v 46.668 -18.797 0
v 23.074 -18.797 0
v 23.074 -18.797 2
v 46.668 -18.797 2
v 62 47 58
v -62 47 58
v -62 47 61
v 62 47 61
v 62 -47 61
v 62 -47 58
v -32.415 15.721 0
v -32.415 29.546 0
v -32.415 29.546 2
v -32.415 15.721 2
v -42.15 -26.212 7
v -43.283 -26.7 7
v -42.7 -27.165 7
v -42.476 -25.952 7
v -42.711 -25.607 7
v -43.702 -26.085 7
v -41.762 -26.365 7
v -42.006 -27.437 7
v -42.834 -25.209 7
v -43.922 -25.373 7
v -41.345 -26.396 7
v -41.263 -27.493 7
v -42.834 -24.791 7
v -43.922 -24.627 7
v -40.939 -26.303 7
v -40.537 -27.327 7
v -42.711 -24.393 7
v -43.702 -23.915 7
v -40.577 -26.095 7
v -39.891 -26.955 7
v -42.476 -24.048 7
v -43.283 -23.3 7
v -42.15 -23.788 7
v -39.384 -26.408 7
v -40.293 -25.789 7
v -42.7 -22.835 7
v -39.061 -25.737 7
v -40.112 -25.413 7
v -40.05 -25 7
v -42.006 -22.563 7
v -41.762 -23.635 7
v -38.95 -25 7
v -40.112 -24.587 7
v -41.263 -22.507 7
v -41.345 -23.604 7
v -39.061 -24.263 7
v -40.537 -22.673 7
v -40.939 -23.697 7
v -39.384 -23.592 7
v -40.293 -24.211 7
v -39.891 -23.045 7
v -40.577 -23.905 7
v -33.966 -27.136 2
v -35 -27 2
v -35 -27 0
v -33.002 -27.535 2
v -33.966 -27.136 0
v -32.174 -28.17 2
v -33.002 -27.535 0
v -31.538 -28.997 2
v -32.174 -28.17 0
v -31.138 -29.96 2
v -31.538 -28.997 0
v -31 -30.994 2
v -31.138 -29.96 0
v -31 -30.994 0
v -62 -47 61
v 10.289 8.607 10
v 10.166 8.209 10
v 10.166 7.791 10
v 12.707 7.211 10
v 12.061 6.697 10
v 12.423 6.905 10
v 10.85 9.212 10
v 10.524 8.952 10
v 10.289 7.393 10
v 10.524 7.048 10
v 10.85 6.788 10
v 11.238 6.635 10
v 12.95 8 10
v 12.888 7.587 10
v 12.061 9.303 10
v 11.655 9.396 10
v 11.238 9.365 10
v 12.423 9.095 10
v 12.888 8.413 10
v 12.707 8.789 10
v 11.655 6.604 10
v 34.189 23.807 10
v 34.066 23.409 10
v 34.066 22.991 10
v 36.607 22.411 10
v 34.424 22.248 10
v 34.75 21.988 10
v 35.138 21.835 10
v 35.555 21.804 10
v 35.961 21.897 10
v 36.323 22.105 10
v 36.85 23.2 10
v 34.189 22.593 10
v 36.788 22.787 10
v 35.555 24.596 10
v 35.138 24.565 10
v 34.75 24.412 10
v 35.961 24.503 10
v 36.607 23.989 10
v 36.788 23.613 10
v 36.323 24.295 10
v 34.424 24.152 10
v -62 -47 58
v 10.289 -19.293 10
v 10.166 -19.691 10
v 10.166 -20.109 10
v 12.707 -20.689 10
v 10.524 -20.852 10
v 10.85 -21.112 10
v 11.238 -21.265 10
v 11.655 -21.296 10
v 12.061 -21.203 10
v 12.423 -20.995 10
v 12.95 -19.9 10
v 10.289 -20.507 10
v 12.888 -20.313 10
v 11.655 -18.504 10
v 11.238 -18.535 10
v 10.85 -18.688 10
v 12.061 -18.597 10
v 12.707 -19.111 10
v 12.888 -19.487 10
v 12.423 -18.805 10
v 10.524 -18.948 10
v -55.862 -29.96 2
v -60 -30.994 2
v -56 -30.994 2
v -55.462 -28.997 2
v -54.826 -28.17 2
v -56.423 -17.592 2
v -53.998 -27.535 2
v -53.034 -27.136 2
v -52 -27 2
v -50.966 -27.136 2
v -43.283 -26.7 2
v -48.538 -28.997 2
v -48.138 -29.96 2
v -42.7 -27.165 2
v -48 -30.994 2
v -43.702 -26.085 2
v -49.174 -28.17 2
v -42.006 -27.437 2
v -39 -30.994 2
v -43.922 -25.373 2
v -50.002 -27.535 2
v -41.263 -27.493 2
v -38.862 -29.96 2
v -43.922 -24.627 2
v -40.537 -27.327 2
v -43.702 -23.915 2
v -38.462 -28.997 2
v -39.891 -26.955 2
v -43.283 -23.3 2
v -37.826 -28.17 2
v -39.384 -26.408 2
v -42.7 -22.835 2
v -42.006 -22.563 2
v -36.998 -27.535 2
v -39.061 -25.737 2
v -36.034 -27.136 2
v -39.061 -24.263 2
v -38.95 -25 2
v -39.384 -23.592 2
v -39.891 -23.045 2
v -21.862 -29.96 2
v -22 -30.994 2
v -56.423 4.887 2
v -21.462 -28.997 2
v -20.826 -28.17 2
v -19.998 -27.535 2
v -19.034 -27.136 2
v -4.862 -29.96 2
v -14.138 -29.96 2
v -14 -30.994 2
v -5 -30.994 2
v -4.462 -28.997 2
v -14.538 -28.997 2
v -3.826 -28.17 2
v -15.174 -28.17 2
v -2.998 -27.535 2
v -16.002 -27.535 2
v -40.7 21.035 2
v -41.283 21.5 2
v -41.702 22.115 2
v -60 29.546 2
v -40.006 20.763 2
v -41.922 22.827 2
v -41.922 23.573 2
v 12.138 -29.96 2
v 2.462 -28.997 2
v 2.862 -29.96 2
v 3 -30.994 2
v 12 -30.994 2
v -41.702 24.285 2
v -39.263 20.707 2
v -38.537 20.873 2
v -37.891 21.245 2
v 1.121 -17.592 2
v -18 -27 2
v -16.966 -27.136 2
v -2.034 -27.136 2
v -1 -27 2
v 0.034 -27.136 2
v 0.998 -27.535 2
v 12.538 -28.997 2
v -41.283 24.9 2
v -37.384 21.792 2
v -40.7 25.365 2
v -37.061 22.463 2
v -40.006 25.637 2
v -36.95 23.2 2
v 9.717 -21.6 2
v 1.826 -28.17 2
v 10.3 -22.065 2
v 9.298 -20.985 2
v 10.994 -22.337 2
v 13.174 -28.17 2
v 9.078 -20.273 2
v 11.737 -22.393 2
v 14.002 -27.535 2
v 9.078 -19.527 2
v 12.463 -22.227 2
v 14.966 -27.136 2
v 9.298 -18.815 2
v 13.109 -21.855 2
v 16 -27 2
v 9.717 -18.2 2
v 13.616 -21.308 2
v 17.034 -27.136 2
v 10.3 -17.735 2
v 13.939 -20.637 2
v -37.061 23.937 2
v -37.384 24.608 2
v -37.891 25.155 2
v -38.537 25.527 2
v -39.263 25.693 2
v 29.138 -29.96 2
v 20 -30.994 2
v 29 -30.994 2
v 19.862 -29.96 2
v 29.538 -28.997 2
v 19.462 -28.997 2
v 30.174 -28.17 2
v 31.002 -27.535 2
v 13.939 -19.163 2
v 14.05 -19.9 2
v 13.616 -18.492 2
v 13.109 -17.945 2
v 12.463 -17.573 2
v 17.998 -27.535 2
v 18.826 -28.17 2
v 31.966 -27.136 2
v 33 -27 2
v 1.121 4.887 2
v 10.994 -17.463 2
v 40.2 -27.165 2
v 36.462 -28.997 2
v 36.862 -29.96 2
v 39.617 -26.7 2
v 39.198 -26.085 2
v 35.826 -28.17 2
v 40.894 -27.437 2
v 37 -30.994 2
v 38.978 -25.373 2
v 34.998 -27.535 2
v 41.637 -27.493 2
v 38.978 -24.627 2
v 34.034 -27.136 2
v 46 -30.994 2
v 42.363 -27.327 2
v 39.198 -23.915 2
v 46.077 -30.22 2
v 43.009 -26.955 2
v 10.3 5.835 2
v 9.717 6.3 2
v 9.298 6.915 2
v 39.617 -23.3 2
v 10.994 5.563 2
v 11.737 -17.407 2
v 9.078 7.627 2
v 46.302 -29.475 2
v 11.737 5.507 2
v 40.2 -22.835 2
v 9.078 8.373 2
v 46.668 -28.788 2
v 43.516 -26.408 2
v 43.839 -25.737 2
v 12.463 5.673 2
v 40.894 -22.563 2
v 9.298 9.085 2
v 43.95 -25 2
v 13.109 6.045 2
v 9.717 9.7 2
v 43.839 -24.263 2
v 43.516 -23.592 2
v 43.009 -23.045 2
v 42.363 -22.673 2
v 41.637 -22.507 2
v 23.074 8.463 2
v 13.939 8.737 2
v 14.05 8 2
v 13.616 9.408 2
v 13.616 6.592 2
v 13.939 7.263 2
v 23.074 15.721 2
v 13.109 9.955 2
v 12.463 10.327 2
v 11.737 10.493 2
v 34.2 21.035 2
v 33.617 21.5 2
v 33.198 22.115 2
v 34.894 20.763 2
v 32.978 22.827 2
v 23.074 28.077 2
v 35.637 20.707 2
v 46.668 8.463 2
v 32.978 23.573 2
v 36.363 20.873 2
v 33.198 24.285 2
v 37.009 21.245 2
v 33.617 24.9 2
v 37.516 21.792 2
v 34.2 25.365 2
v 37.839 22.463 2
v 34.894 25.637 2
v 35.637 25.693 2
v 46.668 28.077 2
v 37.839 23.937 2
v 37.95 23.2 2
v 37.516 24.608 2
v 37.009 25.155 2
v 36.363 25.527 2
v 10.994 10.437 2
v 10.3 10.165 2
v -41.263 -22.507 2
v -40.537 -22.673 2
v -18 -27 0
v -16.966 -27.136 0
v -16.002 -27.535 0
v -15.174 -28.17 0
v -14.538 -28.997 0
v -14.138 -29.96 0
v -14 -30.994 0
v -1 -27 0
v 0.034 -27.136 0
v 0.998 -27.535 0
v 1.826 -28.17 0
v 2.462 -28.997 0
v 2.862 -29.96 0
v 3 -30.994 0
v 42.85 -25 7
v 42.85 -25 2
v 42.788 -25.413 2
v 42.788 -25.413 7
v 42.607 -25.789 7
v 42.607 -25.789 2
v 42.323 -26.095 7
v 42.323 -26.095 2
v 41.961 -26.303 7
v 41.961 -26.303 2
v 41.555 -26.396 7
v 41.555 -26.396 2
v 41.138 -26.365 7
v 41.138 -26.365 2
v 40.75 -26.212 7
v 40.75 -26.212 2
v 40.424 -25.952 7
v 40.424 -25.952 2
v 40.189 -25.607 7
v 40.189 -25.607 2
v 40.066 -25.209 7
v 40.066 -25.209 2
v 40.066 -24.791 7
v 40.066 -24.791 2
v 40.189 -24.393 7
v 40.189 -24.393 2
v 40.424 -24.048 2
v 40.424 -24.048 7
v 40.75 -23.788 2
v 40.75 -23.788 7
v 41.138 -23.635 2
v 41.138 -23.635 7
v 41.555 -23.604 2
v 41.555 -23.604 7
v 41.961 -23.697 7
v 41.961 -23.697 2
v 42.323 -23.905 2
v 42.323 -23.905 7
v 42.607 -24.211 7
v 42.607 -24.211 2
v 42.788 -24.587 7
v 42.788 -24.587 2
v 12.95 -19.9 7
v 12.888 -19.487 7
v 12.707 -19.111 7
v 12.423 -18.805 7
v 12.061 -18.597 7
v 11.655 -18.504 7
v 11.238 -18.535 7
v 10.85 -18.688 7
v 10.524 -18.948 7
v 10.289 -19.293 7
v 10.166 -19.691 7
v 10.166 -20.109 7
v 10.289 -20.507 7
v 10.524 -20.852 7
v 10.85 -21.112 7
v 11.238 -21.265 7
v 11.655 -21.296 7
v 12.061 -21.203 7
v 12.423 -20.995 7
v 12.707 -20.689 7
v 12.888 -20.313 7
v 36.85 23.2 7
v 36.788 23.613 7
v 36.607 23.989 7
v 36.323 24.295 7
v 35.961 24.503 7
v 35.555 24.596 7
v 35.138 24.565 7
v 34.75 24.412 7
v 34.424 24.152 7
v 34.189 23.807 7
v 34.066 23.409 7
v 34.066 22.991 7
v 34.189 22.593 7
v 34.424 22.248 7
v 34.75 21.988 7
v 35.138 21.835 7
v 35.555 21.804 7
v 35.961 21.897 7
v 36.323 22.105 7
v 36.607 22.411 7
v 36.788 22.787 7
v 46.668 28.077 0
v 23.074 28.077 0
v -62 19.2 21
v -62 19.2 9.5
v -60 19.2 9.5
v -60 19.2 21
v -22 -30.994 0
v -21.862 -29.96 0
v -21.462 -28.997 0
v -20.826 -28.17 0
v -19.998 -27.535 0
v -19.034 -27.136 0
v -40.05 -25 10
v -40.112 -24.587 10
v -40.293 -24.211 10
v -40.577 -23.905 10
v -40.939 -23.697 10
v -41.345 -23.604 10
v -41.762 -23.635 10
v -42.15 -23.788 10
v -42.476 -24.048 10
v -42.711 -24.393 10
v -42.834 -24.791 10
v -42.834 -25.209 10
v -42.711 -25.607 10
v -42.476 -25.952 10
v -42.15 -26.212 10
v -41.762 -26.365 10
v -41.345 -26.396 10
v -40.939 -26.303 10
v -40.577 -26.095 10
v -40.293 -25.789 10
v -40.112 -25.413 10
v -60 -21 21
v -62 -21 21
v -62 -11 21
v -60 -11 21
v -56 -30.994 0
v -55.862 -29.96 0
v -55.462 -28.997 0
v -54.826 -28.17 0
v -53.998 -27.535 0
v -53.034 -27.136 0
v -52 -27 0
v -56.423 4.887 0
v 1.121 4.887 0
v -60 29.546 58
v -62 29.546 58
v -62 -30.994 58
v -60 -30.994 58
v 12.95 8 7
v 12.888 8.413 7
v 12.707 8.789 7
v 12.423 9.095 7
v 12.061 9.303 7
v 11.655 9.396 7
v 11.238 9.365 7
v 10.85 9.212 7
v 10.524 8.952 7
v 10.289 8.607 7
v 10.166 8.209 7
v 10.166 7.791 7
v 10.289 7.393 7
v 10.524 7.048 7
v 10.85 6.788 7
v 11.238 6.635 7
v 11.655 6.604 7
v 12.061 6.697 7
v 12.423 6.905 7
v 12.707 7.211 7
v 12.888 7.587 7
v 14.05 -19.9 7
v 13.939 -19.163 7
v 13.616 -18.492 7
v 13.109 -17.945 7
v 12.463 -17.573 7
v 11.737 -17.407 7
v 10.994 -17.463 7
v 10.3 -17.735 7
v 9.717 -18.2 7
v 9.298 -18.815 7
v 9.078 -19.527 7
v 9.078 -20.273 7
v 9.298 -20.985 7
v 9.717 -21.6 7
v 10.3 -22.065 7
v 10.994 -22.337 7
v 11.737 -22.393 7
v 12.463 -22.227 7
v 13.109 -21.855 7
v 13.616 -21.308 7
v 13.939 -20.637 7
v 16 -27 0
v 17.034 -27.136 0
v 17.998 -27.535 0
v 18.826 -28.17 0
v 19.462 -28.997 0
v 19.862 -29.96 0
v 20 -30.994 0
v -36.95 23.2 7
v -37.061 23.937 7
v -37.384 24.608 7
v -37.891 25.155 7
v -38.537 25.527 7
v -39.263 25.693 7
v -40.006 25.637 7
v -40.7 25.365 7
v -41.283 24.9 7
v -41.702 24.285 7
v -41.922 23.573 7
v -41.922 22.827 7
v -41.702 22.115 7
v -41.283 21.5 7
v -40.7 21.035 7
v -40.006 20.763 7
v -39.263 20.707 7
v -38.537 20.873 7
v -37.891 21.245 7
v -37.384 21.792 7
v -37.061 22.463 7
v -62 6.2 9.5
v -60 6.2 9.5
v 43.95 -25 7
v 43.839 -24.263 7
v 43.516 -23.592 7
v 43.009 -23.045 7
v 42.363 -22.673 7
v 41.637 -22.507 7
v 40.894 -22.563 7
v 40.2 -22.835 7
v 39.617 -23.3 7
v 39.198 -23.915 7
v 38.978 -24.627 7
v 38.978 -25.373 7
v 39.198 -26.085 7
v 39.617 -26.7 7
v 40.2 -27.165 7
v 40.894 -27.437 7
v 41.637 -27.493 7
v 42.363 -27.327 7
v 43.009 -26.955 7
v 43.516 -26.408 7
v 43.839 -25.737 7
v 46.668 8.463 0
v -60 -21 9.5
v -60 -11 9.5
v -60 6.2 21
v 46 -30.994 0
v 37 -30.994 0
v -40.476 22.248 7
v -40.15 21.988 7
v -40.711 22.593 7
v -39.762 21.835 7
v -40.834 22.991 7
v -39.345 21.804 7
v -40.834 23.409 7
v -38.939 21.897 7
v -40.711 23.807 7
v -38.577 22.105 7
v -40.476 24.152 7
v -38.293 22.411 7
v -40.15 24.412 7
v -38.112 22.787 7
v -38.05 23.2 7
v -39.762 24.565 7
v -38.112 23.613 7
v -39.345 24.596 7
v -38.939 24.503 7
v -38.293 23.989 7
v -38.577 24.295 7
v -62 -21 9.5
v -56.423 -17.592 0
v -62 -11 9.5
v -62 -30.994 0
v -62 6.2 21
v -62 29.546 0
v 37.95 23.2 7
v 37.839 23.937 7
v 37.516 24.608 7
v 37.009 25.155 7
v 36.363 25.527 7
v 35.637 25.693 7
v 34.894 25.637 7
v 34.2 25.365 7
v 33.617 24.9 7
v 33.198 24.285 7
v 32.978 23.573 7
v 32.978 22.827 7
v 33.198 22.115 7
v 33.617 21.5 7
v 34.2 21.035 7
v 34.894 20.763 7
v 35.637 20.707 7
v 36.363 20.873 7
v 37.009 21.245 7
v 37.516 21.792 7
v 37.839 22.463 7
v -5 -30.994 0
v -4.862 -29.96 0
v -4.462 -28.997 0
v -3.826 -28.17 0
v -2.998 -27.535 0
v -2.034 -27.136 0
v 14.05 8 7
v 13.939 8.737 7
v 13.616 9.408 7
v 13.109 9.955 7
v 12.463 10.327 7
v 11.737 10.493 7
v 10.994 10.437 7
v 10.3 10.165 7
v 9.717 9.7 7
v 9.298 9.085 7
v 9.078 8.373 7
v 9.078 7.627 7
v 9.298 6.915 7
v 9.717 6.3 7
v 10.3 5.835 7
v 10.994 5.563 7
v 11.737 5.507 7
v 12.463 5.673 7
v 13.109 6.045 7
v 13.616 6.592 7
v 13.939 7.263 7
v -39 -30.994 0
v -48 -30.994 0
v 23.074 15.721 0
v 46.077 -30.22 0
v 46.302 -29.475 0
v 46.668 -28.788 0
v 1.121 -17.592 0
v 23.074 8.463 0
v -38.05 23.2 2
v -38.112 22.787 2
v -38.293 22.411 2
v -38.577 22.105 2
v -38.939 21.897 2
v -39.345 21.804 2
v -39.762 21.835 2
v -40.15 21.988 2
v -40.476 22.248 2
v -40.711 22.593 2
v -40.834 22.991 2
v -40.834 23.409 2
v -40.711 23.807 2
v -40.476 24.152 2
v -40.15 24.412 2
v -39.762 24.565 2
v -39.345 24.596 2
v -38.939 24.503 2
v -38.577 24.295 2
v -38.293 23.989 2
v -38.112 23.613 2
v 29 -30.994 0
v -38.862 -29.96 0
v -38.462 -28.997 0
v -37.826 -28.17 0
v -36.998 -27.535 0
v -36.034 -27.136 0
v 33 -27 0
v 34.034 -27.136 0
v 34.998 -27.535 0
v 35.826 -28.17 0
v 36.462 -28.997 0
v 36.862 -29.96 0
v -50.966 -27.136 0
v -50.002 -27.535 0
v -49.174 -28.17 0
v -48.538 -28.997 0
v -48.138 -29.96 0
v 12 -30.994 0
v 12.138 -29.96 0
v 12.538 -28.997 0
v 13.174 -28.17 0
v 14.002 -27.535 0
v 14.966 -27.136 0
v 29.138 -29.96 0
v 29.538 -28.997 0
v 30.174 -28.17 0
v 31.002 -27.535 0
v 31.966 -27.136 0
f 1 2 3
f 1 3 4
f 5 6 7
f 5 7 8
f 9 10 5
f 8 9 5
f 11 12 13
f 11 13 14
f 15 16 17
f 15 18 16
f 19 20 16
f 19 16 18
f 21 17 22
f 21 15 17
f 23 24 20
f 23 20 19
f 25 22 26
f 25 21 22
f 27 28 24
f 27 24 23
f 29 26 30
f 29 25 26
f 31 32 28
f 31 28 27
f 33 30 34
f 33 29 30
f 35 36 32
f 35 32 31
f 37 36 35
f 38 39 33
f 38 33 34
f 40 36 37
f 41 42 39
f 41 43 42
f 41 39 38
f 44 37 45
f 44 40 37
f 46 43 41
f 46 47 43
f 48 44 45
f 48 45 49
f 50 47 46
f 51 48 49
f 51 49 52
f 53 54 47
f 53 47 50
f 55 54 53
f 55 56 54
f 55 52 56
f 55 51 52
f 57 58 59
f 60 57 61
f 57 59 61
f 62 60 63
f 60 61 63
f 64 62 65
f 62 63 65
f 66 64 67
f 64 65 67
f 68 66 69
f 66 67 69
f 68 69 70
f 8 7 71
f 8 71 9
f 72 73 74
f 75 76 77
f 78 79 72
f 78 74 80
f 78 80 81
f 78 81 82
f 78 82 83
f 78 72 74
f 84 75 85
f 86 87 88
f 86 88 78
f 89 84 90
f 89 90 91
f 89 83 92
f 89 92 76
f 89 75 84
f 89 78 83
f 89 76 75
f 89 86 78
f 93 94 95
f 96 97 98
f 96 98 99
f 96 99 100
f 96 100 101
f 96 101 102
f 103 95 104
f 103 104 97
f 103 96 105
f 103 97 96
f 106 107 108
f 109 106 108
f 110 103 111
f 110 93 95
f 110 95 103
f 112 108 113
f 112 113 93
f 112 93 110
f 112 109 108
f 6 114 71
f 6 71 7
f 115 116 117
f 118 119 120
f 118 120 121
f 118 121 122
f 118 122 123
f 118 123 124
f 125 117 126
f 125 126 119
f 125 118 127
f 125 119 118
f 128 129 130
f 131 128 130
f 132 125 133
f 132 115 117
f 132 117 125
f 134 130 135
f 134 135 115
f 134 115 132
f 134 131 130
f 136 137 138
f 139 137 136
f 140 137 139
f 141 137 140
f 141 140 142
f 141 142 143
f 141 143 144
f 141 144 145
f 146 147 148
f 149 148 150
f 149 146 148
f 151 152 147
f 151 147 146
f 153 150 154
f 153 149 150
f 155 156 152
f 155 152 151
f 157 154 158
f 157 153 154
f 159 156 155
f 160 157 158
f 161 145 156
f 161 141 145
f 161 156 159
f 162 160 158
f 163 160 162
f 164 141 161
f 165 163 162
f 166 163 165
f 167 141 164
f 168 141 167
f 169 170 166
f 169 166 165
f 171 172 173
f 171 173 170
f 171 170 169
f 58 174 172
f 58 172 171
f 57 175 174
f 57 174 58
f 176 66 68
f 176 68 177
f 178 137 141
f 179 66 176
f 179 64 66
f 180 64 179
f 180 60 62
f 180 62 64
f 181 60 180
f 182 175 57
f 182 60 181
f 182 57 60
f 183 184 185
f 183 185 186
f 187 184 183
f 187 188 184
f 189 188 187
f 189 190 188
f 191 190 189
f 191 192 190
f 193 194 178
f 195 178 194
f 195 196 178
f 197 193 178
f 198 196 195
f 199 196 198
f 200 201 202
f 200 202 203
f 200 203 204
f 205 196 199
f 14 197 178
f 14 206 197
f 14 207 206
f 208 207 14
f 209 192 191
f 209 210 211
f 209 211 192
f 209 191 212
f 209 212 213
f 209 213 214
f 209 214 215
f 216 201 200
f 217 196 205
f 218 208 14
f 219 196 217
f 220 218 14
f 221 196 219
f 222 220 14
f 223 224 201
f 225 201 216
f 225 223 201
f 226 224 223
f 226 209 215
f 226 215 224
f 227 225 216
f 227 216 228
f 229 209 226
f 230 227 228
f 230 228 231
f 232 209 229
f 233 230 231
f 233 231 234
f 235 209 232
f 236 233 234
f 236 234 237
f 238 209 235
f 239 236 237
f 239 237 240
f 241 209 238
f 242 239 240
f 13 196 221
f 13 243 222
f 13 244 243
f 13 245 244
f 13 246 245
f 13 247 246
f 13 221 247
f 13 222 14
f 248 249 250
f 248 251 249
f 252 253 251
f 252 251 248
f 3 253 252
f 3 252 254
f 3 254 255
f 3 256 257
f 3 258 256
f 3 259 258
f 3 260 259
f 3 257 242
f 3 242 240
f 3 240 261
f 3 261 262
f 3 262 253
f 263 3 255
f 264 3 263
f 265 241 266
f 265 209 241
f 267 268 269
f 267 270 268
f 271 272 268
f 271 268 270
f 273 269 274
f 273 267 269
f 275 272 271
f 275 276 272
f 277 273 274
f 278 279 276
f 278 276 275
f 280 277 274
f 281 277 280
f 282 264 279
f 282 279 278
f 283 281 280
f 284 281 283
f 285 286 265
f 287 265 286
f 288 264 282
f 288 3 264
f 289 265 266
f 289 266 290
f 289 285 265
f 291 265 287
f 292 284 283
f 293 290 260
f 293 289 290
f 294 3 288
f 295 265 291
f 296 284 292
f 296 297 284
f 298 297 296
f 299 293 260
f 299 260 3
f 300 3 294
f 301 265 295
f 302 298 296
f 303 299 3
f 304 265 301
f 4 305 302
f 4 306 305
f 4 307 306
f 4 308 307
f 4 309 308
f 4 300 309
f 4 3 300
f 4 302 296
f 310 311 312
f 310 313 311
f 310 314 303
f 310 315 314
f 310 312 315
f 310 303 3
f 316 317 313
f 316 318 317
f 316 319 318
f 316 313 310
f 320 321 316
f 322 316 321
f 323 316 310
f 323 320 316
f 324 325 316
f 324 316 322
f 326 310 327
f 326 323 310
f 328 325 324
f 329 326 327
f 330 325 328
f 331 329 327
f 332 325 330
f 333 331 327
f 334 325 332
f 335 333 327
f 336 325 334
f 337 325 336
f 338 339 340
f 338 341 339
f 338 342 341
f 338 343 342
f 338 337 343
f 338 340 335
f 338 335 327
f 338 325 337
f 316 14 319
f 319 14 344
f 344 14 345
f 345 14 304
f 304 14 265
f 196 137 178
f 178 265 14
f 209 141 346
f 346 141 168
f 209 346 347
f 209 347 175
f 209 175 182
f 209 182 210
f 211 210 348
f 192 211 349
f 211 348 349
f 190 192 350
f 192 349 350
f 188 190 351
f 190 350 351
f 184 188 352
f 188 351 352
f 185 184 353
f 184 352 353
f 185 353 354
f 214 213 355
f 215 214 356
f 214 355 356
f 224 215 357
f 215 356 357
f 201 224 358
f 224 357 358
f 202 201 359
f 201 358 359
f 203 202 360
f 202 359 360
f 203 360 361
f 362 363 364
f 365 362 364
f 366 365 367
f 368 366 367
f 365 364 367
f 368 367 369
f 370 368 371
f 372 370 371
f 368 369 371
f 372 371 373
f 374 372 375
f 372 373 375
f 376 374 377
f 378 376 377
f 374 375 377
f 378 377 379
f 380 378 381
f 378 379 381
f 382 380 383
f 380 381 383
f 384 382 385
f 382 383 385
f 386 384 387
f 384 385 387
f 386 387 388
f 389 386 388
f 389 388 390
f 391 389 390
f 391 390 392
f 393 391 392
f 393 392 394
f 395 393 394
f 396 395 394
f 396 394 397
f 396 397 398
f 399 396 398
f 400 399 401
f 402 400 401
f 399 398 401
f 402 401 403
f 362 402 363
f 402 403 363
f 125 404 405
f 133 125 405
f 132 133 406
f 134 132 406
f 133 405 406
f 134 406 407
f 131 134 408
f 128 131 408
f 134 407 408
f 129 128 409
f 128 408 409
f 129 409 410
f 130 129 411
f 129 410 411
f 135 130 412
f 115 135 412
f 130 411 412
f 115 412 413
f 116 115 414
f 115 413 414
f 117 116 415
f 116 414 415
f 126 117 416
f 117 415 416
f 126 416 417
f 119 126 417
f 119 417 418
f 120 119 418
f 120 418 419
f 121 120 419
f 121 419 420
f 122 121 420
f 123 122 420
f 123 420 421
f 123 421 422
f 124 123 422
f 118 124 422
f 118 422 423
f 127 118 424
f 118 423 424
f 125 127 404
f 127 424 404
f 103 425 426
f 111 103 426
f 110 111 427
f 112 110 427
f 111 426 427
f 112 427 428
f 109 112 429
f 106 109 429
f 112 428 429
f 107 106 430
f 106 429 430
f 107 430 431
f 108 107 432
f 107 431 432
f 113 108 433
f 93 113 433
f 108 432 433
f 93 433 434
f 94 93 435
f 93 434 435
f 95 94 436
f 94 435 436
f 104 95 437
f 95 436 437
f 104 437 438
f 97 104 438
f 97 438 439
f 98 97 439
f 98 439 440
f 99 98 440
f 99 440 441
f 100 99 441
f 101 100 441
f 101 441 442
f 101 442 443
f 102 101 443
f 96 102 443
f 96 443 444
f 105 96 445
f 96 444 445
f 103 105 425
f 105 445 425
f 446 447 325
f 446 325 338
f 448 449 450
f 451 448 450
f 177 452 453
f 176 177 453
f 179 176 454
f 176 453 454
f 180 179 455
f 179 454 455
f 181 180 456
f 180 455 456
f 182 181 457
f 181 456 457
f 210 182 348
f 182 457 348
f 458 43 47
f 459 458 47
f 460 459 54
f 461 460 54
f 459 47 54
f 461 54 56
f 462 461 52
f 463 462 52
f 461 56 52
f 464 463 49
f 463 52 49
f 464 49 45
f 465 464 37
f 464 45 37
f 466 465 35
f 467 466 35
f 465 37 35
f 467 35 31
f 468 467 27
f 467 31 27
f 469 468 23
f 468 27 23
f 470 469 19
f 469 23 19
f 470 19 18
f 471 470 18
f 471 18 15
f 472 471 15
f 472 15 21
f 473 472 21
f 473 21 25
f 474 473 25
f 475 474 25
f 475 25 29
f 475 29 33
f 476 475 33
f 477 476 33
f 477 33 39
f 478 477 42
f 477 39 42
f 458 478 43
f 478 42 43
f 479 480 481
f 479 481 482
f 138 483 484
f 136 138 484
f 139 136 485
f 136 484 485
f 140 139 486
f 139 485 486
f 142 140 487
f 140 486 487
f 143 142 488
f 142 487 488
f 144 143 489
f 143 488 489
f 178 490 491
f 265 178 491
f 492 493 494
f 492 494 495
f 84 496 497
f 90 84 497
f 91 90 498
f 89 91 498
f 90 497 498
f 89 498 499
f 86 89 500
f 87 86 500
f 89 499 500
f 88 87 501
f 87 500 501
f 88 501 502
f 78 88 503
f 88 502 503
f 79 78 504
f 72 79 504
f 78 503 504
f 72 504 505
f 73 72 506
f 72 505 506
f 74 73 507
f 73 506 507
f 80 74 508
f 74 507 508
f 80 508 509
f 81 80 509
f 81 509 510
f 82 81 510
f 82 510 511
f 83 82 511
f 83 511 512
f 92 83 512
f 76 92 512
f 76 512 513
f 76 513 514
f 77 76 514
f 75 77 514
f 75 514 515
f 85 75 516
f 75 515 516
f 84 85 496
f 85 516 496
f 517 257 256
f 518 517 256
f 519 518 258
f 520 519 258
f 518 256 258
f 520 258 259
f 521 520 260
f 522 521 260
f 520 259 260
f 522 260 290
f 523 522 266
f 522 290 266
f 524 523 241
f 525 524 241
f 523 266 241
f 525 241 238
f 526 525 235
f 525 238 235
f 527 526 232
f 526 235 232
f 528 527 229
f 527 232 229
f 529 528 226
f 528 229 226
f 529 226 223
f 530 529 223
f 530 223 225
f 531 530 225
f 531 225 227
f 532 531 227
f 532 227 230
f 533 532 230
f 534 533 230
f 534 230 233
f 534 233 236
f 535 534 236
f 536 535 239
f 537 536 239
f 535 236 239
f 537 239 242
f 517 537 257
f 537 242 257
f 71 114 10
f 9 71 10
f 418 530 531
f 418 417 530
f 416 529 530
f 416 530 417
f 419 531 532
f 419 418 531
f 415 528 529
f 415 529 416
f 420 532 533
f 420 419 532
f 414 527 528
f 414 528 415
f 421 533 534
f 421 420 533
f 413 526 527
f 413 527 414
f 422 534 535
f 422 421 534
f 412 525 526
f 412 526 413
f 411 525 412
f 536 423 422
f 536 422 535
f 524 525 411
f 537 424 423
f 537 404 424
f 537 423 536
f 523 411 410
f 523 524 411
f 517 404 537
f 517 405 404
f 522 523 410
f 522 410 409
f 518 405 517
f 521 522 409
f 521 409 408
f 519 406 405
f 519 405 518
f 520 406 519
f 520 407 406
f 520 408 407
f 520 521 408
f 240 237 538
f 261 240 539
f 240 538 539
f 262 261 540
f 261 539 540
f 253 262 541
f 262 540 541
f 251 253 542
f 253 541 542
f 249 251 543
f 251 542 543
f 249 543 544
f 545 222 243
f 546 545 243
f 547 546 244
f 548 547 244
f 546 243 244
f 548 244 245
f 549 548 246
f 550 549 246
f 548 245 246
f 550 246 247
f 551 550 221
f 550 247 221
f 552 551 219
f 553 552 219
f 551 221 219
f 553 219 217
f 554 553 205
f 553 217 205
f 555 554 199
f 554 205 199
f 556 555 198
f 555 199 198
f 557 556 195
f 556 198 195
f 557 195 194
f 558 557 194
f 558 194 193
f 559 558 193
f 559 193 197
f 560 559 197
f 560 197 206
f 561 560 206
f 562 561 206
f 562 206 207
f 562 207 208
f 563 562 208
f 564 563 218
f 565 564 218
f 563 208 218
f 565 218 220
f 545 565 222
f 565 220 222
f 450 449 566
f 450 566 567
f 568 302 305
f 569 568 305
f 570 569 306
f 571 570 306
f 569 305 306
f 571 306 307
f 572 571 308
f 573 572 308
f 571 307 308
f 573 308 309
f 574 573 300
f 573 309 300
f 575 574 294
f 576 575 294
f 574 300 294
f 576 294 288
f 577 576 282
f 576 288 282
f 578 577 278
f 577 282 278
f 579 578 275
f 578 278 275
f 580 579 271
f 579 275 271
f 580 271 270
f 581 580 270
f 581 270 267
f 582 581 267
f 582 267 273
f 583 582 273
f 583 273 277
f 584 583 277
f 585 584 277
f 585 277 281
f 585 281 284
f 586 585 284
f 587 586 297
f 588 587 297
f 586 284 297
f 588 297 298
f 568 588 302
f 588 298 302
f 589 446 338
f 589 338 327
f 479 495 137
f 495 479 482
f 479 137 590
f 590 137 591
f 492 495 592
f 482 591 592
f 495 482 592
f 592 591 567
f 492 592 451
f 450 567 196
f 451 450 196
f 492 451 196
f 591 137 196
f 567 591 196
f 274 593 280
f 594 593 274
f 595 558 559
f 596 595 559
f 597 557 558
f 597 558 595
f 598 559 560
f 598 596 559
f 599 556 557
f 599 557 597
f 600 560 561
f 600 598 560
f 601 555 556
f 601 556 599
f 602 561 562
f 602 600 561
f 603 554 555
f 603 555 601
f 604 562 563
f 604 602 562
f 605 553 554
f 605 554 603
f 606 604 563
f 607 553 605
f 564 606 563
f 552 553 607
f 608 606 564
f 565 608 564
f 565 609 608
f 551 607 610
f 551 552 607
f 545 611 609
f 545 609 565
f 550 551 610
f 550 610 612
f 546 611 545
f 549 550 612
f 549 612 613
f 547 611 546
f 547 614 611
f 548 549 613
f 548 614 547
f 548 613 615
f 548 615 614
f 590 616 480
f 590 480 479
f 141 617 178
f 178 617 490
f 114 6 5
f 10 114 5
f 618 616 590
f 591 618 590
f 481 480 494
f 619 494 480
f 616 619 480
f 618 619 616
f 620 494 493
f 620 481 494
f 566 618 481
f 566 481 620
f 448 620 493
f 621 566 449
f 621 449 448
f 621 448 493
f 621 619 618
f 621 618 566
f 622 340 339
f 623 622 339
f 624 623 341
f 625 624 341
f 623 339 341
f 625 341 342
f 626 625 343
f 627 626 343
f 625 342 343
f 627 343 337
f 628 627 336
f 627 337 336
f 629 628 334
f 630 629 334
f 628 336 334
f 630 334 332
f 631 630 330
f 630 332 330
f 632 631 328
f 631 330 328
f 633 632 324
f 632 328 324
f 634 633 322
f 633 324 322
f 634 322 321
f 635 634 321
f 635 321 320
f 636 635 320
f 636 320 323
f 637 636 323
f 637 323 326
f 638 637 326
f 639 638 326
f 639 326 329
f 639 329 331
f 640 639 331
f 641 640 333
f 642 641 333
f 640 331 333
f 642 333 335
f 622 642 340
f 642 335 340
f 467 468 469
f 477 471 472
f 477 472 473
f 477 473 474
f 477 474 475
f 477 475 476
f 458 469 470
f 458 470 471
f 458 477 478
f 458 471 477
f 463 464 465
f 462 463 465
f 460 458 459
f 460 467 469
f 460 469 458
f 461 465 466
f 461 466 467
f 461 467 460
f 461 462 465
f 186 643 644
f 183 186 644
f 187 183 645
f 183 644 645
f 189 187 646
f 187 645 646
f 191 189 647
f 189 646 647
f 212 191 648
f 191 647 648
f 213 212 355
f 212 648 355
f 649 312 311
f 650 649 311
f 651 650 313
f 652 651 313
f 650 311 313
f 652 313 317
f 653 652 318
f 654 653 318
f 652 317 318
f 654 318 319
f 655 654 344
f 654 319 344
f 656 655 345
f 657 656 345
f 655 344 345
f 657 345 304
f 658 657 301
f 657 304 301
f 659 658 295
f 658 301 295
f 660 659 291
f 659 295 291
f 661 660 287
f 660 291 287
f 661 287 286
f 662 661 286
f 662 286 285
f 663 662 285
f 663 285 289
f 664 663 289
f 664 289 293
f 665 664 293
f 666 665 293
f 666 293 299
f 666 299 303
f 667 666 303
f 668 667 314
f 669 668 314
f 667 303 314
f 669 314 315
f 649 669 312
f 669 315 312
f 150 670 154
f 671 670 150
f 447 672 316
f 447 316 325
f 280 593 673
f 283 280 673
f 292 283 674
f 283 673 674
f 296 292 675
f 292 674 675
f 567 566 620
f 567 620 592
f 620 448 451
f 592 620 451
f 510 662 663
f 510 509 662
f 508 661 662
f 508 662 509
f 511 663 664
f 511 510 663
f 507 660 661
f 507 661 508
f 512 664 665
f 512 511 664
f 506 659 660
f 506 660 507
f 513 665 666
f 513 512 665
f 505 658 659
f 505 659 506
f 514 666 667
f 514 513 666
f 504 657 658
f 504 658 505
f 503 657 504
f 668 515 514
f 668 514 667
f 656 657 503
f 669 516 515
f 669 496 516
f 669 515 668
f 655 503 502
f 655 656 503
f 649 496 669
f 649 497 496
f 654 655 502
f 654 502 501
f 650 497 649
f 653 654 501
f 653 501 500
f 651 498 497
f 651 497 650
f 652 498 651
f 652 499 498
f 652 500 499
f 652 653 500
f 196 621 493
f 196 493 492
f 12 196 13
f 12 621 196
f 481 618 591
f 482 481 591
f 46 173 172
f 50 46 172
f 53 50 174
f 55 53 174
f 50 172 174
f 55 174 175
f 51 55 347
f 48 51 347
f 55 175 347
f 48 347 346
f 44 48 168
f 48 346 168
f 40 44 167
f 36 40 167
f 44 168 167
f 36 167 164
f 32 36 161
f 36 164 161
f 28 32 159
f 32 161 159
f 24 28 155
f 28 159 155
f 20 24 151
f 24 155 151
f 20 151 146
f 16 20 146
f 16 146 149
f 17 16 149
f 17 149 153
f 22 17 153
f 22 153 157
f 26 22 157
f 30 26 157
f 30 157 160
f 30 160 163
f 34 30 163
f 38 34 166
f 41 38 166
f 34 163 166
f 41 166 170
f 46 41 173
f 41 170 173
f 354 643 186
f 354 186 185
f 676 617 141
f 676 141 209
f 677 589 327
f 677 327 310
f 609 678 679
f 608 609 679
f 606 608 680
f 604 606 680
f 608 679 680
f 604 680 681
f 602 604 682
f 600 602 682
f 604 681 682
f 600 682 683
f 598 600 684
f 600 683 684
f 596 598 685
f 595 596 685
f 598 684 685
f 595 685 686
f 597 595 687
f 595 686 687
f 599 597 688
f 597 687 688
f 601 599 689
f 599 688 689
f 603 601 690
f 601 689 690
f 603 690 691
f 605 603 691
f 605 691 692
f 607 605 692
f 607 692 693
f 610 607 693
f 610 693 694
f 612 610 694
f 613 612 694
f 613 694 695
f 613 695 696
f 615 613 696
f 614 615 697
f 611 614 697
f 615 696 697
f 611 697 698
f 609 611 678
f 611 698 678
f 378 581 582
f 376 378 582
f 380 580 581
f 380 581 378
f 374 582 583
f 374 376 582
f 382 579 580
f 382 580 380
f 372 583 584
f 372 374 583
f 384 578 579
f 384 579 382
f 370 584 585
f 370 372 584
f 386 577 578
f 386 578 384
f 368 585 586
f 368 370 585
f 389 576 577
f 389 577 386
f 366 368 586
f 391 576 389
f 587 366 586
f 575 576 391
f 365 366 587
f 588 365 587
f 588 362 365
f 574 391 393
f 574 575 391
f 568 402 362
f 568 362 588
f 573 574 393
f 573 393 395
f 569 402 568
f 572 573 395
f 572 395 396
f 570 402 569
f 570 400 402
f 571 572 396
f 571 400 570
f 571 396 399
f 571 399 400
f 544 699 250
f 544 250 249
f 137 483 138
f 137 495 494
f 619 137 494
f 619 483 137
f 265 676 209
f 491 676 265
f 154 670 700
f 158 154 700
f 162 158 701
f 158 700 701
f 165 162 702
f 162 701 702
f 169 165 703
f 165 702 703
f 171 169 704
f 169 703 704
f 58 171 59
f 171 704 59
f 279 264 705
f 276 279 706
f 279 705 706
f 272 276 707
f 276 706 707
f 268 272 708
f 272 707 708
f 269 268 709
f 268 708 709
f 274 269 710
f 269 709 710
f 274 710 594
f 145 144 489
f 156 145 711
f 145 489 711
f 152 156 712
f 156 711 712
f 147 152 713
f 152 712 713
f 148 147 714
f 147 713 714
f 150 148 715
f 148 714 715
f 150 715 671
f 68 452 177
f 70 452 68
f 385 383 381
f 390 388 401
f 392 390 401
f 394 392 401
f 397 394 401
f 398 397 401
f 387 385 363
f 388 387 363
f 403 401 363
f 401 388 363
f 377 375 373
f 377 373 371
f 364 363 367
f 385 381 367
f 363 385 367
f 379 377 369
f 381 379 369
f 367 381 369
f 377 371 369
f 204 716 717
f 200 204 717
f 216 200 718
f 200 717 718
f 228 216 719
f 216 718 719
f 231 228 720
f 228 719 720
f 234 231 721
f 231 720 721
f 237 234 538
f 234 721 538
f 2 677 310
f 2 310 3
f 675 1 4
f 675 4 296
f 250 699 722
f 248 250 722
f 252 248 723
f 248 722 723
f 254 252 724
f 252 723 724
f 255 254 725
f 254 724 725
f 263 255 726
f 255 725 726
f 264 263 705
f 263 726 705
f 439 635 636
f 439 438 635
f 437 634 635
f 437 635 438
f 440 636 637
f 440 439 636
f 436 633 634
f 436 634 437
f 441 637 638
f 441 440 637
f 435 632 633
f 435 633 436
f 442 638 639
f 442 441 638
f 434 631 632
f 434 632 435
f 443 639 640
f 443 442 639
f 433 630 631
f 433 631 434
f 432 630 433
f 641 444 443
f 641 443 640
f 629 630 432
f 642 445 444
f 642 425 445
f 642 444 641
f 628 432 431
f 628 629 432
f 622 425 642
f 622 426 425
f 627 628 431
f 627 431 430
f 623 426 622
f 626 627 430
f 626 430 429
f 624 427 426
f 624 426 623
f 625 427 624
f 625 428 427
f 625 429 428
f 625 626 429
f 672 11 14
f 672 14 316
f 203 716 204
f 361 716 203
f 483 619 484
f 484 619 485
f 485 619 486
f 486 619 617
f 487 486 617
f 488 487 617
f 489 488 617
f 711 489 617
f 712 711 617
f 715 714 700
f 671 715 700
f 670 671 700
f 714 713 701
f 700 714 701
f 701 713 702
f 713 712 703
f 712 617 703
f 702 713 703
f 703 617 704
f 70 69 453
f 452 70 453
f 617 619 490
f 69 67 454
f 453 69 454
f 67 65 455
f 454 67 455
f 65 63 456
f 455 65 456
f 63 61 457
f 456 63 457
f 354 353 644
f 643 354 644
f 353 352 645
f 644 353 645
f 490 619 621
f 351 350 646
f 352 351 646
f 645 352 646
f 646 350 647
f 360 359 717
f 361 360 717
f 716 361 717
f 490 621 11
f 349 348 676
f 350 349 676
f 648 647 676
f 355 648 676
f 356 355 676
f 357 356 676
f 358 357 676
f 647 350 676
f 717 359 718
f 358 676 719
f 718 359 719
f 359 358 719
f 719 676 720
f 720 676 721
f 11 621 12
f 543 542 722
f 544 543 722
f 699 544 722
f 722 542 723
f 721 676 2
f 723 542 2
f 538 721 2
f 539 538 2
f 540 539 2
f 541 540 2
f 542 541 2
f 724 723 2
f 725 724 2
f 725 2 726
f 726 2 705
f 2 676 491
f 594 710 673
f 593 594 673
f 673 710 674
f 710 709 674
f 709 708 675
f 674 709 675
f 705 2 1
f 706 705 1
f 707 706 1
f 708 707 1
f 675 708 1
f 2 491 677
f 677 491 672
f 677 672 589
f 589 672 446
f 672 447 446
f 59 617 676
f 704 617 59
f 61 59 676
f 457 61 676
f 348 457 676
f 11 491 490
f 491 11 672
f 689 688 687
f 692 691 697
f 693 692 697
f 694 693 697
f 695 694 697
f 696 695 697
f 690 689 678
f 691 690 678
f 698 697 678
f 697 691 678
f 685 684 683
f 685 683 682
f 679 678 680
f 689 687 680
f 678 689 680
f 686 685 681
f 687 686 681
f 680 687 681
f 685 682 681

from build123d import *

# Parameters (mm, degrees)
F0_W      = 124
F0_H      = 94
F1_DEPTH  = 2
F2_DEPTH  = 58
F3_R      = 2.5
F4_DEPTH  = 5
F5_R      = 1.4
F6_DEPTH  = 3
F7_D      = 2.8
F7_DEPTH  = 5
F7_TIP    = 0.8412048666
F9_DEPTH  = 8
F10_W     = 1
F10_H     = 50
F11_DEPTH = 3
F12_W     = 5
F12_H     = 3
F13_DEPTH = 1
F14_W     = 124
F14_H     = 94
F15_DEPTH = 3
F17_W     = 2
F17_H     = 13
F17_H_2   = 10
F18_DEPTH = 11.5
F19_W     = 199.5194256306
F19_H     = 143.535412848
F19_W_2   = 57.5444861315
F19_H_2   = 22.4794349963
F20_DEPTH = 100


# Not quite as in the source:
# - a feature names something its author has since deleted; it is built from what else it names


with BuildPart() as f1:
    # F0 (on Top) → F1 (new body)
    with BuildSketch(Plane.XY):
        Rectangle(F0_W, F0_H)
        Polygon((-60, -45), (-60, 45), (60, 45), (60, 31), (60, 29), (60, -45), align=None, mode=Mode.SUBTRACT)
        Polygon((60, 45), (-60, 45), (-60, -45), (60, -45), (60, 29), (60, 31), align=None)
    extrude(amount=F1_DEPTH)

    # F0 (on Top) → F2 (join)
    with BuildSketch(Plane.XY):
        Rectangle(F0_W, F0_H)
        Polygon((-60, -45), (-60, 45), (60, 45), (60, 31), (60, 29), (60, -45), align=None, mode=Mode.SUBTRACT)
    extrude(amount=F2_DEPTH)

    # F3 (on face) → F4 (join)
    with BuildSketch(Plane.XY.offset(2)):
        with Locations((35.45, 23.2)):
            Circle(F3_R)
        with Locations((11.55, -19.9)):
            Circle(F3_R)
        with Locations((41.45, -25)):
            Circle(F3_R)
        with Locations((11.55, 8)):
            Circle(F3_R)
        with Locations((-39.45, 23.2)):
            Circle(F3_R)
        with Locations((-41.45, -25)):
            Circle(F3_R)
    extrude(amount=F4_DEPTH)

    # F5 (on face) → F6 (join)
    with BuildSketch(Plane.XY.offset(7)):
        with Locations((35.45, 23.2)):
            Circle(F5_R)
        with Locations((11.55, 8)):
            Circle(F5_R)
        with Locations((11.55, -19.9)):
            Circle(F5_R)
        with Locations((-41.45, -25)):
            Circle(F5_R)
    extrude(amount=F6_DEPTH)

    # F7 (one way)
    with BuildSketch(Plane(origin=(0, 0, 2), x_dir=(1, 0, 0), z_dir=(0, 0, -1))):
        with Locations((-39.45, -23.2), (41.45, 25)):
            Circle(F7_D / 2)
    extrude(amount=-F7_DEPTH, mode=Mode.SUBTRACT)
    with Locations(Plane(origin=(0, 0, 2), x_dir=(1, 0, 0), z_dir=(0, 0, -1))):
        with Locations((-39.45, -23.2), (41.45, 25)):
            with Locations((0, 0, -(F7_DEPTH + F7_TIP / 2))):  # 118° drill point
                Cone(0, F7_D / 2, F7_TIP, mode=Mode.SUBTRACT)

    # F8 (on face) → F9 (cut)
    with BuildSketch(Plane(origin=(0, 0, 0), x_dir=(1, 0, 0), z_dir=(0, 0, -1))):
        with BuildLine():
            Line((-52, 27), (-52, 47))
            Line((-52, 47), (-56, 47))
            Line((-56, 47), (-56, 31))
            ThreePointArc((-56, 31), (-54.8284271247, 28.1715728753), (-52, 27))
        make_face()
        with BuildLine():
            Line((-48, 47), (-52, 47))
            Line((-52, 47), (-52, 27))
            ThreePointArc((-52, 27), (-49.1715728753, 28.1715728753), (-48, 31))
            Line((-48, 31), (-48, 47))
        make_face()
        with BuildLine():
            Line((-35, 47), (-39, 47))
            Line((-39, 47), (-39, 31))
            ThreePointArc((-39, 31), (-37.8284271247, 28.1715728753), (-35, 27))
            ThreePointArc((-35, 27), (-32.1715728753, 28.1715728753), (-31, 31))
            Line((-31, 31), (-31, 47))
            Line((-31, 47), (-35, 47))
        make_face()
        with BuildLine():
            Line((-18, 47), (-22, 47))
            Line((-22, 47), (-22, 31))
            ThreePointArc((-22, 31), (-20.8284271247, 28.1715728753), (-18, 27))
            ThreePointArc((-18, 27), (-15.1715728753, 28.1715728753), (-14, 31))
            Line((-14, 31), (-14, 47))
            Line((-14, 47), (-18, 47))
        make_face()
        with BuildLine():
            Line((-1, 47), (-5, 47))
            Line((-5, 47), (-5, 31))
            ThreePointArc((-5, 31), (-3.8284271247, 28.1715728753), (-1, 27))
            ThreePointArc((-1, 27), (1.8284271247, 28.1715728753), (3, 31))
            Line((3, 31), (3, 47))
            Line((3, 47), (-1, 47))
        make_face()
        with BuildLine():
            Line((16, 47), (12, 47))
            Line((12, 47), (12, 31))
            ThreePointArc((12, 31), (13.1715728753, 28.1715728753), (16, 27))
            ThreePointArc((16, 27), (18.8284271247, 28.1715728753), (20, 31))
            Line((20, 31), (20, 47))
            Line((20, 47), (16, 47))
        make_face()
        with BuildLine():
            Line((37, 31), (37, 47))
            Line((37, 47), (33, 47))
            Line((33, 47), (29, 47))
            Line((29, 47), (29, 31))
            ThreePointArc((29, 31), (30.1715728753, 28.1715728753), (33, 27))
            ThreePointArc((33, 27), (35.8284271247, 28.1715728753), (37, 31))
        make_face()
        with BuildLine():
            Line((54, 31), (54, 47))
            Line((54, 47), (50, 47))
            Line((50, 47), (46, 47))
            Line((46, 47), (46, 31))
            ThreePointArc((46, 31), (47.1715728753, 28.1715728753), (50, 27))
            ThreePointArc((50, 27), (52.8284271247, 28.1715728753), (54, 31))
        make_face()
    extrude(amount=-F9_DEPTH, mode=Mode.SUBTRACT)

    # F10 (on face) → F11 (join)
    with BuildSketch(Plane.XZ.offset(-45)):
        with Locations((-42, 27)):
            Rectangle(F10_W, F10_H)
        with Locations((-38, 27)):
            Rectangle(F10_W, F10_H)
        with Locations((2, 27)):
            Rectangle(F10_W, F10_H)
        with Locations((-2, 27)):
            Rectangle(F10_W, F10_H)
        with Locations((38, 27)):
            Rectangle(F10_W, F10_H)
        with Locations((42, 27)):
            Rectangle(F10_W, F10_H)
    extrude(amount=F11_DEPTH)

    # F12 (on face) → F13 (join)
    with BuildSketch(Plane.XZ.offset(-42)):
        with Locations((0, 50.5)):
            Rectangle(F12_W, F12_H)
        with Locations((0, 42.5)):
            Rectangle(F12_W, F12_H)
        with Locations((0, 35.5)):
            Rectangle(F12_W, F12_H)
        with Locations((0, 27.5)):
            Rectangle(F12_W, F12_H)
        with Locations((0, 19.5)):
            Rectangle(F12_W, F12_H)
        with Locations((0, 11.5)):
            Rectangle(F12_W, F12_H)
        with Locations((40, 19.5)):
            Rectangle(F12_W, F12_H)
        with Locations((40, 42.5)):
            Rectangle(F12_W, F12_H)
        with Locations((40, 50.5)):
            Rectangle(F12_W, F12_H)
        with Locations((40, 35.5)):
            Rectangle(F12_W, F12_H)
        with Locations((40, 27.5)):
            Rectangle(F12_W, F12_H)
        with Locations((40, 11.5)):
            Rectangle(F12_W, F12_H)
        with Locations((-40, 19.5)):
            Rectangle(F12_W, F12_H)
        with Locations((-40, 50.5)):
            Rectangle(F12_W, F12_H)
        with Locations((-40, 27.5)):
            Rectangle(F12_W, F12_H)
        with Locations((-40, 35.5)):
            Rectangle(F12_W, F12_H)
        with Locations((-40, 11.5)):
            Rectangle(F12_W, F12_H)
        with Locations((-40, 42.5)):
            Rectangle(F12_W, F12_H)
    extrude(amount=-F13_DEPTH)

    # F17 (on offset) → F18 (cut)
    with BuildSketch(Plane.XY.offset(9.5)):
        with Locations((-61, 12.7)):
            Rectangle(F17_W, F17_H)
        with Locations((-61, -16)):
            Rectangle(F17_W, F17_H_2)
    extrude(amount=F18_DEPTH, mode=Mode.SUBTRACT)

    # F19 (on Top) → F20 (cut)
    with BuildSketch(Plane.XY):
        with Locations((2.5972127914, -1.2879259884)):
            Rectangle(F19_W, F19_H)
        Polygon((-68.1005078713, -30.994397391), (-68.1005078713, 29.5461390275), (-32.4154566388, 29.5461390275), (-32.4154566388, 15.7205138463), (23.0738711198, 15.7205138463), (23.0738711198, 28.0771622352), (46.6675695452, 28.0771622352), (46.6675695452, 8.4633265807), (23.0738711198, 8.4633265807), (23.0738711198, -18.7967714509), (46.6675695452, -18.7967714509), (46.6675695452, -30.994397391), align=None, mode=Mode.SUBTRACT)
        with Locations((-27.6512478013, -6.3523130957)):
            Rectangle(F19_W_2, F19_H_2)
    extrude(amount=F20_DEPTH, mode=Mode.SUBTRACT)


with BuildPart() as f15:
    # F14 (on face) → F15 (new body)
    with BuildSketch(Plane.XY.offset(58)):
        Rectangle(F14_W, F14_H)
    extrude(amount=F15_DEPTH)


solid = Compound([f1.part, f15.part])
